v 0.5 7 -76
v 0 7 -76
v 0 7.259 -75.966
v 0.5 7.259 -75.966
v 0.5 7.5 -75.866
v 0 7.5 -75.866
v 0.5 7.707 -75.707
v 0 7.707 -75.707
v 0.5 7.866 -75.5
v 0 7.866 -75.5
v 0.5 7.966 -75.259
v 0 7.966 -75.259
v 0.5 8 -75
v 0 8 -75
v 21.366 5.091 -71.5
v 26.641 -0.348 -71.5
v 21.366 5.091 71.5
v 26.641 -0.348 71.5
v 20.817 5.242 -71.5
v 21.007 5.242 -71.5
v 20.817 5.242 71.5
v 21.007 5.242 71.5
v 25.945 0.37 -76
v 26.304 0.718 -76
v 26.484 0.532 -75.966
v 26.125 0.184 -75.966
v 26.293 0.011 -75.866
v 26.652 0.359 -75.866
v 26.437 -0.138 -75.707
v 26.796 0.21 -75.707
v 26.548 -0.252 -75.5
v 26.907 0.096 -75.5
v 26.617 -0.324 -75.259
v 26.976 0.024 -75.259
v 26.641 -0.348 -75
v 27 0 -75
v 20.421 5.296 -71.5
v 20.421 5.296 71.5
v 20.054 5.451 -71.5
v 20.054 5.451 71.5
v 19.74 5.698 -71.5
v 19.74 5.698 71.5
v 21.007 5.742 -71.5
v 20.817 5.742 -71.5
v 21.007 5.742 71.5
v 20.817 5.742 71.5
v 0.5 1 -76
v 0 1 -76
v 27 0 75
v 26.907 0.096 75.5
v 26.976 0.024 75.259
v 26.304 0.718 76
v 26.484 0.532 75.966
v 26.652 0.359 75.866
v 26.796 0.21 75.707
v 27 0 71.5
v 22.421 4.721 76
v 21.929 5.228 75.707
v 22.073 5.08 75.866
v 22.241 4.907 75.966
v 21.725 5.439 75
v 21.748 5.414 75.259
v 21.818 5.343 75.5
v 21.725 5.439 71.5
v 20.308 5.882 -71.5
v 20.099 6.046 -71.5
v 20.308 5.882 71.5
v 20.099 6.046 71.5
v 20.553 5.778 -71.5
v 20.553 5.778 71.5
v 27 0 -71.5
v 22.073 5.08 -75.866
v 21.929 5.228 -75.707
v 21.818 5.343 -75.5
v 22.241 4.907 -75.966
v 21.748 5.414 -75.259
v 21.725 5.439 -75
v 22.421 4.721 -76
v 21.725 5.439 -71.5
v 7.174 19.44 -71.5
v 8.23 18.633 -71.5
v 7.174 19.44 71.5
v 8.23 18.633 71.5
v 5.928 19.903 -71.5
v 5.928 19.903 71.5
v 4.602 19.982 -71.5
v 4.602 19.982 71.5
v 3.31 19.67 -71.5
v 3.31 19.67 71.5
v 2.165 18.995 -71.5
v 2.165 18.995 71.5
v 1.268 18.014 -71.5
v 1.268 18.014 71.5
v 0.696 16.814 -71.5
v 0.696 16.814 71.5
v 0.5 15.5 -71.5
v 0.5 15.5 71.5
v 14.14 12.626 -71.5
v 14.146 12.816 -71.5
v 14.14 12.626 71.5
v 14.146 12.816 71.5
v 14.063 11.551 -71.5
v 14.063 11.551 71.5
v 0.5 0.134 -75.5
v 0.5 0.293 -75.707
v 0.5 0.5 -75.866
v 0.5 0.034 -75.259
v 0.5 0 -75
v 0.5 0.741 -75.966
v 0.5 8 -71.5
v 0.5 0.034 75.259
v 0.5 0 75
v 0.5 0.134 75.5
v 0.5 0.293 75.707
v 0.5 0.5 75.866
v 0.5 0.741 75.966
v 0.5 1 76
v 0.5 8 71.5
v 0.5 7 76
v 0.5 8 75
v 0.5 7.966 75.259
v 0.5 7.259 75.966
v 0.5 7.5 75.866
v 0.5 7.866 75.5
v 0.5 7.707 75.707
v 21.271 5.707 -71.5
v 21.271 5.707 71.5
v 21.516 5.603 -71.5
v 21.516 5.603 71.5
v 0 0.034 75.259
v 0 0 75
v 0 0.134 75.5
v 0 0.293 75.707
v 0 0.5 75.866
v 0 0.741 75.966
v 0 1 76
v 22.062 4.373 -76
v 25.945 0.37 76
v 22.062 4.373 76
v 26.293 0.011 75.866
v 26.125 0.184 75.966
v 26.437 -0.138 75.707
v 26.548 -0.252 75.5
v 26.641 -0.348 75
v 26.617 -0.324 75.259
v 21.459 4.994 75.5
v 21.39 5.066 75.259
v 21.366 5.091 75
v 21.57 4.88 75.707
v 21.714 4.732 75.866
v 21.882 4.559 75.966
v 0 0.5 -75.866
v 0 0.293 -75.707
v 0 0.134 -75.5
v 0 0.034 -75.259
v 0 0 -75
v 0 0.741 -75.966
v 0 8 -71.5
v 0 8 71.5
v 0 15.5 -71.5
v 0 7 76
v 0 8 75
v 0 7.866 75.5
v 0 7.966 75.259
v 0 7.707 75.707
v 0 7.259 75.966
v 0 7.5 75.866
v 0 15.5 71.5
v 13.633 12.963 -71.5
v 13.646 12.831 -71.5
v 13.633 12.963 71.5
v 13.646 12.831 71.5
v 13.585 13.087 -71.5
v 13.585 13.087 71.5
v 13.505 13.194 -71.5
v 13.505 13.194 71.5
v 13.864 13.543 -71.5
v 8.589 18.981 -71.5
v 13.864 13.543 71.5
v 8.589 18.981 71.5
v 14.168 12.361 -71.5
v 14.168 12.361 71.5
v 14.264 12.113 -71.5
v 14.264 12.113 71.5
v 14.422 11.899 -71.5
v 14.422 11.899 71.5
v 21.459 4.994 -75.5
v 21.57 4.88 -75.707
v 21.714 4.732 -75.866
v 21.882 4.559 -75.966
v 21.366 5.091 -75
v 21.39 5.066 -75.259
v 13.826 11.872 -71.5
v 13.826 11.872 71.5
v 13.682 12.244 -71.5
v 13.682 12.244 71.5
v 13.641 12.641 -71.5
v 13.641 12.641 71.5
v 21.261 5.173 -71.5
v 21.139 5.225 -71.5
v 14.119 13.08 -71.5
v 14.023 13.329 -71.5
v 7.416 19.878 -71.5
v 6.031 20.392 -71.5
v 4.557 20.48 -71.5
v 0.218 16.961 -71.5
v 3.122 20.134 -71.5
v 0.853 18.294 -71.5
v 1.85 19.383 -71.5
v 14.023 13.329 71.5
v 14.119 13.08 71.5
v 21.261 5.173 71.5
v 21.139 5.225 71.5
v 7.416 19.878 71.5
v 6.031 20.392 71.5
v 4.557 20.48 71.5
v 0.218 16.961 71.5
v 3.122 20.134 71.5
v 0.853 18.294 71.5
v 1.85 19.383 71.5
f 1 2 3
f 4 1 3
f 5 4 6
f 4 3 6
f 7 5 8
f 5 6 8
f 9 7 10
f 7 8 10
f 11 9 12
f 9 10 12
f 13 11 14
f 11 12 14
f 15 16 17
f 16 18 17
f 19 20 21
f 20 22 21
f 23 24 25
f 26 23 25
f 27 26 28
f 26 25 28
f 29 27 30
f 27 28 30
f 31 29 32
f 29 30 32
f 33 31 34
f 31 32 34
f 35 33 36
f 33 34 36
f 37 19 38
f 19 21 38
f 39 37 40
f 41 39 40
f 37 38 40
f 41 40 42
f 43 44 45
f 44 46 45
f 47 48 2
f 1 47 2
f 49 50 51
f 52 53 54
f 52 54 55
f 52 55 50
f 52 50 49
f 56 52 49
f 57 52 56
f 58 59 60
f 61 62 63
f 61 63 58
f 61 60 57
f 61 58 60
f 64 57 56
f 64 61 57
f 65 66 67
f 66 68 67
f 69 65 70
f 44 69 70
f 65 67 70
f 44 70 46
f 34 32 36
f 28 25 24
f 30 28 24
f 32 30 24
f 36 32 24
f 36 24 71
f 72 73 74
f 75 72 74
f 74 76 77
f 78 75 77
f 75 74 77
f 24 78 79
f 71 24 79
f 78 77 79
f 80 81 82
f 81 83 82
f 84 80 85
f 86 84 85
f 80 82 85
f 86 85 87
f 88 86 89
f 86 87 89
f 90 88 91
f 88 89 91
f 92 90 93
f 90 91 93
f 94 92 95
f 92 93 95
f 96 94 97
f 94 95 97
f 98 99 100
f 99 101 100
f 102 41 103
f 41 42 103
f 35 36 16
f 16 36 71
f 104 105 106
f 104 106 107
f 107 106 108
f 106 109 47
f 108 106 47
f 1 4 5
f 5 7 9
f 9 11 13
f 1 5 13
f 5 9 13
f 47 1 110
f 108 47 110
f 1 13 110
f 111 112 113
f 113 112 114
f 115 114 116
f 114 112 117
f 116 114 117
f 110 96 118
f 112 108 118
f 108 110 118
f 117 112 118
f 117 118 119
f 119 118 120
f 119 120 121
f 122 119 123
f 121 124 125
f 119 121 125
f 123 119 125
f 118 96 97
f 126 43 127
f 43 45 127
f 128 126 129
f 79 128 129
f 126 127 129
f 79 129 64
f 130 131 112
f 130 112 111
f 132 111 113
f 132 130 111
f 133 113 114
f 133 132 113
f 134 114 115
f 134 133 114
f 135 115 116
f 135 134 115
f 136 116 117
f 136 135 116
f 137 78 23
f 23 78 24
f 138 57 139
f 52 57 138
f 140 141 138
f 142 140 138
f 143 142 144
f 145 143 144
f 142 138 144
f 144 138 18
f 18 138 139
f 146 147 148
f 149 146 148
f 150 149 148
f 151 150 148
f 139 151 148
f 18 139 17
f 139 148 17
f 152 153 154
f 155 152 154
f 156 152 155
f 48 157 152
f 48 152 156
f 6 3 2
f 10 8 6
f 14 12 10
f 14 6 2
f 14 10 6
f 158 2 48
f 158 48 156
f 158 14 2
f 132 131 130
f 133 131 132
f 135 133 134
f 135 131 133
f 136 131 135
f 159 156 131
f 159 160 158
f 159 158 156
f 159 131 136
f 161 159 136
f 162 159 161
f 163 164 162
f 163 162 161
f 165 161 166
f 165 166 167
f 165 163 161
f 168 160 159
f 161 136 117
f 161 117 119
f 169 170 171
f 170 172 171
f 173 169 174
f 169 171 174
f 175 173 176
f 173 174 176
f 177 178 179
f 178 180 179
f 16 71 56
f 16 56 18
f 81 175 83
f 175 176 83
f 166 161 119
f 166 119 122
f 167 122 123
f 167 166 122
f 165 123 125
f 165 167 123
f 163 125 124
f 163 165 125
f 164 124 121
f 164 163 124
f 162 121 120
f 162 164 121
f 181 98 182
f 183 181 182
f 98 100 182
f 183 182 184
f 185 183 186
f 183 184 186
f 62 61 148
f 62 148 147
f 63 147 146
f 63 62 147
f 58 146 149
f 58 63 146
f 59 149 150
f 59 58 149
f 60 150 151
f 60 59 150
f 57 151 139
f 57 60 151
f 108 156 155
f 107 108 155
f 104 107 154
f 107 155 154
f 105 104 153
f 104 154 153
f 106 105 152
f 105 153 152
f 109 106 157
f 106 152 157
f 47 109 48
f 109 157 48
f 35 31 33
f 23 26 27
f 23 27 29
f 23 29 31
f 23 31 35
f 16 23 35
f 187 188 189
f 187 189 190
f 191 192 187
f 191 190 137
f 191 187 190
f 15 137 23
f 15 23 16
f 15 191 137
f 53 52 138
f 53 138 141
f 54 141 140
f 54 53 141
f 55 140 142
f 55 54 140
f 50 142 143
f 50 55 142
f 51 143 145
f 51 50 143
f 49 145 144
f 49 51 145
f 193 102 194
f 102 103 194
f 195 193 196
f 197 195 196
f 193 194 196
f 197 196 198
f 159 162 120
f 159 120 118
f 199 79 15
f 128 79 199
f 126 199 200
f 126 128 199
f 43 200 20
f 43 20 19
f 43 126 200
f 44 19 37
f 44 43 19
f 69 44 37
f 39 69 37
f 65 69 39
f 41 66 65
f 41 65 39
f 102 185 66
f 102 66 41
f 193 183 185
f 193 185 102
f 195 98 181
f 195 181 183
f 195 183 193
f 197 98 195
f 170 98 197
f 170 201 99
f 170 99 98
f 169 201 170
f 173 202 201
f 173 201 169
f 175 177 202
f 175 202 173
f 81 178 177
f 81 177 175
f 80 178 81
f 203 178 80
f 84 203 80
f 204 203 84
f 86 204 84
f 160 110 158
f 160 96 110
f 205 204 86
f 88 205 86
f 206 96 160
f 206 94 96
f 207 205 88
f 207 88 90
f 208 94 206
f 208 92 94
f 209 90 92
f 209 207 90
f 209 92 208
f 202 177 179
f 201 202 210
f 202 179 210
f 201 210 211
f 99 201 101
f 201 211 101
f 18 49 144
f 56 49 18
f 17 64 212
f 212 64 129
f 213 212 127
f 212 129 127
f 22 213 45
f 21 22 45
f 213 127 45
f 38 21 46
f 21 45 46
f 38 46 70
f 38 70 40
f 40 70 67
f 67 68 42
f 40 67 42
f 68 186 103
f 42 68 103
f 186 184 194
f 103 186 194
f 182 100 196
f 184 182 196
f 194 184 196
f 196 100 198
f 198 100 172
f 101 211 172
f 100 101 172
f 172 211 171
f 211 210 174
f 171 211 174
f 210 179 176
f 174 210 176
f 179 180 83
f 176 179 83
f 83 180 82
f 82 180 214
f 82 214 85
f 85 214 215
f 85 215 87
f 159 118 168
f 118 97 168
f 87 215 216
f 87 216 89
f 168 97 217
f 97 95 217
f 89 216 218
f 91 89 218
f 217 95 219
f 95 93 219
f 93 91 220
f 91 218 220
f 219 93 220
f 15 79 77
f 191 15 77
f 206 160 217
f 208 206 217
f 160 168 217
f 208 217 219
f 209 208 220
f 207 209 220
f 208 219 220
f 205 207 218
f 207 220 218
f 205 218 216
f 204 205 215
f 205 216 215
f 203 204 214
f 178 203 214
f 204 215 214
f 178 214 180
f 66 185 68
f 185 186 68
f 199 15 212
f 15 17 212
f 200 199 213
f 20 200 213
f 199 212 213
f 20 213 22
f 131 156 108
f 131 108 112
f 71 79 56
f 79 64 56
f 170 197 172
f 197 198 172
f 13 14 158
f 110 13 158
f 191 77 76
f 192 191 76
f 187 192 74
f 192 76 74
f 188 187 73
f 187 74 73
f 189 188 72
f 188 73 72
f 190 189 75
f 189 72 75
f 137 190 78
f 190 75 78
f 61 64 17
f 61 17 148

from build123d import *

# Parameters (mm, degrees)
BOSS_EXTRUDE1_DEPTH = 71.5
BOSS_EXTRUDE2_DEPTH = 0.5
BOSS_EXTRUDE3_DEPTH = 0.5


with BuildPart() as part:
    # Sketch1 → Boss-Extrude1 (new, symmetric)
    with BuildSketch(Plane.XY):
        with BuildLine():
            Line((0, 0), (0, 15.5))
            ThreePointArc((0, 15.5), (3.121859218, 20.133852307), (8.589034881, 18.981210799))
            Line((8.589034881, 18.981210799), (13.864340006, 13.54251283))
            ThreePointArc((13.864340006, 13.54251283), (14.078923552, 13.207723175), (14.146067988, 12.81577696))
            Line((14.146067988, 12.81577696), (14.140269037, 12.625696624))
            ThreePointArc((14.140269037, 12.625696624), (14.207413473, 12.233750409), (14.421997019, 11.898960755))
            Line((14.421997019, 11.898960755), (20.098912151, 6.04621365))
            ThreePointArc((20.098912151, 6.04621365), (20.427002666, 5.821520915), (20.816719127, 5.742455809))
            Line((20.816719127, 5.742455809), (21.006887899, 5.742455809))
            ThreePointArc((21.006887899, 5.742455809), (21.39660436, 5.663390704), (21.724694875, 5.438697969))
            Line((21.724694875, 5.438697969), (27, 0))
            Line((27, 0), (26.641096512, -0.34812108))
            Line((26.641096512, -0.34812108), (21.365791387, 5.090576889))
            ThreePointArc((21.365791387, 5.090576889), (21.20174613, 5.202923257), (21.006887899, 5.242455809))
            Line((21.006887899, 5.242455809), (20.816719127, 5.242455809))
            ThreePointArc((20.816719127, 5.242455809), (20.232144435, 5.361053468), (19.740008663, 5.69809257))
            Line((19.740008663, 5.69809257), (14.063093531, 11.550839675))
            ThreePointArc((14.063093531, 11.550839675), (13.741218212, 12.053024156), (13.640501557, 12.640943479))
            Line((13.640501557, 12.640943479), (13.646300509, 12.831023815))
            ThreePointArc((13.646300509, 12.831023815), (13.612728291, 13.026996922), (13.505436518, 13.19439175))
            Line((13.505436518, 13.19439175), (8.230131393, 18.633089719))
            ThreePointArc((8.230131393, 18.633089719), (3.309673296, 19.670467076), (0.5, 15.5))
            Line((0.5, 15.5), (0.5, 0))
            Line((0.5, 0), (0, 0))
        make_face()
    extrude(amount=BOSS_EXTRUDE1_DEPTH, both=True)

    # Sketch2 → Boss-Extrude2 (add)
    with BuildSketch(Plane(origin=(0, 0, 0), x_dir=(0, 0, -1), z_dir=(1, 0, 0))):
        with BuildLine():
            Line((-71.5, 0), (-75, 0))
            ThreePointArc((-75, 0), (-75.707106781, 0.292893219), (-76, 1))
            Line((-76, 1), (-76, 7))
            ThreePointArc((-76, 7), (-75.707106781, 7.707106781), (-75, 8))
            Line((-75, 8), (-71.5, 8))
            Line((-71.5, 8), (-71.5, 0))
        make_face()
        with BuildLine():
            Line((71.5, 8), (71.5, 0))
            Line((71.5, 0), (75, 0))
            ThreePointArc((75, 0), (75.707106781, 0.292893219), (76, 1))
            Line((76, 1), (76, 7))
            ThreePointArc((76, 7), (75.707106781, 7.707106781), (75, 8))
            Line((75, 8), (71.5, 8))
        make_face()
    extrude(amount=BOSS_EXTRUDE2_DEPTH)

    # Sketch3 → Boss-Extrude3 (add)
    with BuildSketch(Plane(origin=(13.911665086, 13.493721942, 0), x_dir=(0, 0, -1), z_dir=(0.7178069761649953, 0.696242159718058, 0))):
        with BuildLine():
            Line((-71.5, -11.221713136), (-75, -11.221713136))
            ThreePointArc((-75, -11.221713136), (-75.707106781, -11.514606354), (-76, -12.221713136))
            Line((-76, -12.221713136), (-76, -17.798538312))
            ThreePointArc((-76, -17.798538312), (-75.707106781, -18.505645094), (-75, -18.798538312))
            Line((-75, -18.798538312), (-71.5, -18.798538312))
            Line((-71.5, -18.798538312), (-71.5, -11.221713136))
        make_face()
        with BuildLine():
            Line((71.5, -18.798538312), (71.5, -11.221713136))
            Line((71.5, -11.221713136), (75, -11.221713136))
            ThreePointArc((75, -11.221713136), (75.707106781, -11.514606354), (76, -12.221713136))
            Line((76, -12.221713136), (76, -17.798538312))
            ThreePointArc((76, -17.798538312), (75.707106781, -18.505645094), (75, -18.798538312))
            Line((75, -18.798538312), (71.5, -18.798538312))
        make_face()
    extrude(amount=-BOSS_EXTRUDE3_DEPTH)


solid = part.part
